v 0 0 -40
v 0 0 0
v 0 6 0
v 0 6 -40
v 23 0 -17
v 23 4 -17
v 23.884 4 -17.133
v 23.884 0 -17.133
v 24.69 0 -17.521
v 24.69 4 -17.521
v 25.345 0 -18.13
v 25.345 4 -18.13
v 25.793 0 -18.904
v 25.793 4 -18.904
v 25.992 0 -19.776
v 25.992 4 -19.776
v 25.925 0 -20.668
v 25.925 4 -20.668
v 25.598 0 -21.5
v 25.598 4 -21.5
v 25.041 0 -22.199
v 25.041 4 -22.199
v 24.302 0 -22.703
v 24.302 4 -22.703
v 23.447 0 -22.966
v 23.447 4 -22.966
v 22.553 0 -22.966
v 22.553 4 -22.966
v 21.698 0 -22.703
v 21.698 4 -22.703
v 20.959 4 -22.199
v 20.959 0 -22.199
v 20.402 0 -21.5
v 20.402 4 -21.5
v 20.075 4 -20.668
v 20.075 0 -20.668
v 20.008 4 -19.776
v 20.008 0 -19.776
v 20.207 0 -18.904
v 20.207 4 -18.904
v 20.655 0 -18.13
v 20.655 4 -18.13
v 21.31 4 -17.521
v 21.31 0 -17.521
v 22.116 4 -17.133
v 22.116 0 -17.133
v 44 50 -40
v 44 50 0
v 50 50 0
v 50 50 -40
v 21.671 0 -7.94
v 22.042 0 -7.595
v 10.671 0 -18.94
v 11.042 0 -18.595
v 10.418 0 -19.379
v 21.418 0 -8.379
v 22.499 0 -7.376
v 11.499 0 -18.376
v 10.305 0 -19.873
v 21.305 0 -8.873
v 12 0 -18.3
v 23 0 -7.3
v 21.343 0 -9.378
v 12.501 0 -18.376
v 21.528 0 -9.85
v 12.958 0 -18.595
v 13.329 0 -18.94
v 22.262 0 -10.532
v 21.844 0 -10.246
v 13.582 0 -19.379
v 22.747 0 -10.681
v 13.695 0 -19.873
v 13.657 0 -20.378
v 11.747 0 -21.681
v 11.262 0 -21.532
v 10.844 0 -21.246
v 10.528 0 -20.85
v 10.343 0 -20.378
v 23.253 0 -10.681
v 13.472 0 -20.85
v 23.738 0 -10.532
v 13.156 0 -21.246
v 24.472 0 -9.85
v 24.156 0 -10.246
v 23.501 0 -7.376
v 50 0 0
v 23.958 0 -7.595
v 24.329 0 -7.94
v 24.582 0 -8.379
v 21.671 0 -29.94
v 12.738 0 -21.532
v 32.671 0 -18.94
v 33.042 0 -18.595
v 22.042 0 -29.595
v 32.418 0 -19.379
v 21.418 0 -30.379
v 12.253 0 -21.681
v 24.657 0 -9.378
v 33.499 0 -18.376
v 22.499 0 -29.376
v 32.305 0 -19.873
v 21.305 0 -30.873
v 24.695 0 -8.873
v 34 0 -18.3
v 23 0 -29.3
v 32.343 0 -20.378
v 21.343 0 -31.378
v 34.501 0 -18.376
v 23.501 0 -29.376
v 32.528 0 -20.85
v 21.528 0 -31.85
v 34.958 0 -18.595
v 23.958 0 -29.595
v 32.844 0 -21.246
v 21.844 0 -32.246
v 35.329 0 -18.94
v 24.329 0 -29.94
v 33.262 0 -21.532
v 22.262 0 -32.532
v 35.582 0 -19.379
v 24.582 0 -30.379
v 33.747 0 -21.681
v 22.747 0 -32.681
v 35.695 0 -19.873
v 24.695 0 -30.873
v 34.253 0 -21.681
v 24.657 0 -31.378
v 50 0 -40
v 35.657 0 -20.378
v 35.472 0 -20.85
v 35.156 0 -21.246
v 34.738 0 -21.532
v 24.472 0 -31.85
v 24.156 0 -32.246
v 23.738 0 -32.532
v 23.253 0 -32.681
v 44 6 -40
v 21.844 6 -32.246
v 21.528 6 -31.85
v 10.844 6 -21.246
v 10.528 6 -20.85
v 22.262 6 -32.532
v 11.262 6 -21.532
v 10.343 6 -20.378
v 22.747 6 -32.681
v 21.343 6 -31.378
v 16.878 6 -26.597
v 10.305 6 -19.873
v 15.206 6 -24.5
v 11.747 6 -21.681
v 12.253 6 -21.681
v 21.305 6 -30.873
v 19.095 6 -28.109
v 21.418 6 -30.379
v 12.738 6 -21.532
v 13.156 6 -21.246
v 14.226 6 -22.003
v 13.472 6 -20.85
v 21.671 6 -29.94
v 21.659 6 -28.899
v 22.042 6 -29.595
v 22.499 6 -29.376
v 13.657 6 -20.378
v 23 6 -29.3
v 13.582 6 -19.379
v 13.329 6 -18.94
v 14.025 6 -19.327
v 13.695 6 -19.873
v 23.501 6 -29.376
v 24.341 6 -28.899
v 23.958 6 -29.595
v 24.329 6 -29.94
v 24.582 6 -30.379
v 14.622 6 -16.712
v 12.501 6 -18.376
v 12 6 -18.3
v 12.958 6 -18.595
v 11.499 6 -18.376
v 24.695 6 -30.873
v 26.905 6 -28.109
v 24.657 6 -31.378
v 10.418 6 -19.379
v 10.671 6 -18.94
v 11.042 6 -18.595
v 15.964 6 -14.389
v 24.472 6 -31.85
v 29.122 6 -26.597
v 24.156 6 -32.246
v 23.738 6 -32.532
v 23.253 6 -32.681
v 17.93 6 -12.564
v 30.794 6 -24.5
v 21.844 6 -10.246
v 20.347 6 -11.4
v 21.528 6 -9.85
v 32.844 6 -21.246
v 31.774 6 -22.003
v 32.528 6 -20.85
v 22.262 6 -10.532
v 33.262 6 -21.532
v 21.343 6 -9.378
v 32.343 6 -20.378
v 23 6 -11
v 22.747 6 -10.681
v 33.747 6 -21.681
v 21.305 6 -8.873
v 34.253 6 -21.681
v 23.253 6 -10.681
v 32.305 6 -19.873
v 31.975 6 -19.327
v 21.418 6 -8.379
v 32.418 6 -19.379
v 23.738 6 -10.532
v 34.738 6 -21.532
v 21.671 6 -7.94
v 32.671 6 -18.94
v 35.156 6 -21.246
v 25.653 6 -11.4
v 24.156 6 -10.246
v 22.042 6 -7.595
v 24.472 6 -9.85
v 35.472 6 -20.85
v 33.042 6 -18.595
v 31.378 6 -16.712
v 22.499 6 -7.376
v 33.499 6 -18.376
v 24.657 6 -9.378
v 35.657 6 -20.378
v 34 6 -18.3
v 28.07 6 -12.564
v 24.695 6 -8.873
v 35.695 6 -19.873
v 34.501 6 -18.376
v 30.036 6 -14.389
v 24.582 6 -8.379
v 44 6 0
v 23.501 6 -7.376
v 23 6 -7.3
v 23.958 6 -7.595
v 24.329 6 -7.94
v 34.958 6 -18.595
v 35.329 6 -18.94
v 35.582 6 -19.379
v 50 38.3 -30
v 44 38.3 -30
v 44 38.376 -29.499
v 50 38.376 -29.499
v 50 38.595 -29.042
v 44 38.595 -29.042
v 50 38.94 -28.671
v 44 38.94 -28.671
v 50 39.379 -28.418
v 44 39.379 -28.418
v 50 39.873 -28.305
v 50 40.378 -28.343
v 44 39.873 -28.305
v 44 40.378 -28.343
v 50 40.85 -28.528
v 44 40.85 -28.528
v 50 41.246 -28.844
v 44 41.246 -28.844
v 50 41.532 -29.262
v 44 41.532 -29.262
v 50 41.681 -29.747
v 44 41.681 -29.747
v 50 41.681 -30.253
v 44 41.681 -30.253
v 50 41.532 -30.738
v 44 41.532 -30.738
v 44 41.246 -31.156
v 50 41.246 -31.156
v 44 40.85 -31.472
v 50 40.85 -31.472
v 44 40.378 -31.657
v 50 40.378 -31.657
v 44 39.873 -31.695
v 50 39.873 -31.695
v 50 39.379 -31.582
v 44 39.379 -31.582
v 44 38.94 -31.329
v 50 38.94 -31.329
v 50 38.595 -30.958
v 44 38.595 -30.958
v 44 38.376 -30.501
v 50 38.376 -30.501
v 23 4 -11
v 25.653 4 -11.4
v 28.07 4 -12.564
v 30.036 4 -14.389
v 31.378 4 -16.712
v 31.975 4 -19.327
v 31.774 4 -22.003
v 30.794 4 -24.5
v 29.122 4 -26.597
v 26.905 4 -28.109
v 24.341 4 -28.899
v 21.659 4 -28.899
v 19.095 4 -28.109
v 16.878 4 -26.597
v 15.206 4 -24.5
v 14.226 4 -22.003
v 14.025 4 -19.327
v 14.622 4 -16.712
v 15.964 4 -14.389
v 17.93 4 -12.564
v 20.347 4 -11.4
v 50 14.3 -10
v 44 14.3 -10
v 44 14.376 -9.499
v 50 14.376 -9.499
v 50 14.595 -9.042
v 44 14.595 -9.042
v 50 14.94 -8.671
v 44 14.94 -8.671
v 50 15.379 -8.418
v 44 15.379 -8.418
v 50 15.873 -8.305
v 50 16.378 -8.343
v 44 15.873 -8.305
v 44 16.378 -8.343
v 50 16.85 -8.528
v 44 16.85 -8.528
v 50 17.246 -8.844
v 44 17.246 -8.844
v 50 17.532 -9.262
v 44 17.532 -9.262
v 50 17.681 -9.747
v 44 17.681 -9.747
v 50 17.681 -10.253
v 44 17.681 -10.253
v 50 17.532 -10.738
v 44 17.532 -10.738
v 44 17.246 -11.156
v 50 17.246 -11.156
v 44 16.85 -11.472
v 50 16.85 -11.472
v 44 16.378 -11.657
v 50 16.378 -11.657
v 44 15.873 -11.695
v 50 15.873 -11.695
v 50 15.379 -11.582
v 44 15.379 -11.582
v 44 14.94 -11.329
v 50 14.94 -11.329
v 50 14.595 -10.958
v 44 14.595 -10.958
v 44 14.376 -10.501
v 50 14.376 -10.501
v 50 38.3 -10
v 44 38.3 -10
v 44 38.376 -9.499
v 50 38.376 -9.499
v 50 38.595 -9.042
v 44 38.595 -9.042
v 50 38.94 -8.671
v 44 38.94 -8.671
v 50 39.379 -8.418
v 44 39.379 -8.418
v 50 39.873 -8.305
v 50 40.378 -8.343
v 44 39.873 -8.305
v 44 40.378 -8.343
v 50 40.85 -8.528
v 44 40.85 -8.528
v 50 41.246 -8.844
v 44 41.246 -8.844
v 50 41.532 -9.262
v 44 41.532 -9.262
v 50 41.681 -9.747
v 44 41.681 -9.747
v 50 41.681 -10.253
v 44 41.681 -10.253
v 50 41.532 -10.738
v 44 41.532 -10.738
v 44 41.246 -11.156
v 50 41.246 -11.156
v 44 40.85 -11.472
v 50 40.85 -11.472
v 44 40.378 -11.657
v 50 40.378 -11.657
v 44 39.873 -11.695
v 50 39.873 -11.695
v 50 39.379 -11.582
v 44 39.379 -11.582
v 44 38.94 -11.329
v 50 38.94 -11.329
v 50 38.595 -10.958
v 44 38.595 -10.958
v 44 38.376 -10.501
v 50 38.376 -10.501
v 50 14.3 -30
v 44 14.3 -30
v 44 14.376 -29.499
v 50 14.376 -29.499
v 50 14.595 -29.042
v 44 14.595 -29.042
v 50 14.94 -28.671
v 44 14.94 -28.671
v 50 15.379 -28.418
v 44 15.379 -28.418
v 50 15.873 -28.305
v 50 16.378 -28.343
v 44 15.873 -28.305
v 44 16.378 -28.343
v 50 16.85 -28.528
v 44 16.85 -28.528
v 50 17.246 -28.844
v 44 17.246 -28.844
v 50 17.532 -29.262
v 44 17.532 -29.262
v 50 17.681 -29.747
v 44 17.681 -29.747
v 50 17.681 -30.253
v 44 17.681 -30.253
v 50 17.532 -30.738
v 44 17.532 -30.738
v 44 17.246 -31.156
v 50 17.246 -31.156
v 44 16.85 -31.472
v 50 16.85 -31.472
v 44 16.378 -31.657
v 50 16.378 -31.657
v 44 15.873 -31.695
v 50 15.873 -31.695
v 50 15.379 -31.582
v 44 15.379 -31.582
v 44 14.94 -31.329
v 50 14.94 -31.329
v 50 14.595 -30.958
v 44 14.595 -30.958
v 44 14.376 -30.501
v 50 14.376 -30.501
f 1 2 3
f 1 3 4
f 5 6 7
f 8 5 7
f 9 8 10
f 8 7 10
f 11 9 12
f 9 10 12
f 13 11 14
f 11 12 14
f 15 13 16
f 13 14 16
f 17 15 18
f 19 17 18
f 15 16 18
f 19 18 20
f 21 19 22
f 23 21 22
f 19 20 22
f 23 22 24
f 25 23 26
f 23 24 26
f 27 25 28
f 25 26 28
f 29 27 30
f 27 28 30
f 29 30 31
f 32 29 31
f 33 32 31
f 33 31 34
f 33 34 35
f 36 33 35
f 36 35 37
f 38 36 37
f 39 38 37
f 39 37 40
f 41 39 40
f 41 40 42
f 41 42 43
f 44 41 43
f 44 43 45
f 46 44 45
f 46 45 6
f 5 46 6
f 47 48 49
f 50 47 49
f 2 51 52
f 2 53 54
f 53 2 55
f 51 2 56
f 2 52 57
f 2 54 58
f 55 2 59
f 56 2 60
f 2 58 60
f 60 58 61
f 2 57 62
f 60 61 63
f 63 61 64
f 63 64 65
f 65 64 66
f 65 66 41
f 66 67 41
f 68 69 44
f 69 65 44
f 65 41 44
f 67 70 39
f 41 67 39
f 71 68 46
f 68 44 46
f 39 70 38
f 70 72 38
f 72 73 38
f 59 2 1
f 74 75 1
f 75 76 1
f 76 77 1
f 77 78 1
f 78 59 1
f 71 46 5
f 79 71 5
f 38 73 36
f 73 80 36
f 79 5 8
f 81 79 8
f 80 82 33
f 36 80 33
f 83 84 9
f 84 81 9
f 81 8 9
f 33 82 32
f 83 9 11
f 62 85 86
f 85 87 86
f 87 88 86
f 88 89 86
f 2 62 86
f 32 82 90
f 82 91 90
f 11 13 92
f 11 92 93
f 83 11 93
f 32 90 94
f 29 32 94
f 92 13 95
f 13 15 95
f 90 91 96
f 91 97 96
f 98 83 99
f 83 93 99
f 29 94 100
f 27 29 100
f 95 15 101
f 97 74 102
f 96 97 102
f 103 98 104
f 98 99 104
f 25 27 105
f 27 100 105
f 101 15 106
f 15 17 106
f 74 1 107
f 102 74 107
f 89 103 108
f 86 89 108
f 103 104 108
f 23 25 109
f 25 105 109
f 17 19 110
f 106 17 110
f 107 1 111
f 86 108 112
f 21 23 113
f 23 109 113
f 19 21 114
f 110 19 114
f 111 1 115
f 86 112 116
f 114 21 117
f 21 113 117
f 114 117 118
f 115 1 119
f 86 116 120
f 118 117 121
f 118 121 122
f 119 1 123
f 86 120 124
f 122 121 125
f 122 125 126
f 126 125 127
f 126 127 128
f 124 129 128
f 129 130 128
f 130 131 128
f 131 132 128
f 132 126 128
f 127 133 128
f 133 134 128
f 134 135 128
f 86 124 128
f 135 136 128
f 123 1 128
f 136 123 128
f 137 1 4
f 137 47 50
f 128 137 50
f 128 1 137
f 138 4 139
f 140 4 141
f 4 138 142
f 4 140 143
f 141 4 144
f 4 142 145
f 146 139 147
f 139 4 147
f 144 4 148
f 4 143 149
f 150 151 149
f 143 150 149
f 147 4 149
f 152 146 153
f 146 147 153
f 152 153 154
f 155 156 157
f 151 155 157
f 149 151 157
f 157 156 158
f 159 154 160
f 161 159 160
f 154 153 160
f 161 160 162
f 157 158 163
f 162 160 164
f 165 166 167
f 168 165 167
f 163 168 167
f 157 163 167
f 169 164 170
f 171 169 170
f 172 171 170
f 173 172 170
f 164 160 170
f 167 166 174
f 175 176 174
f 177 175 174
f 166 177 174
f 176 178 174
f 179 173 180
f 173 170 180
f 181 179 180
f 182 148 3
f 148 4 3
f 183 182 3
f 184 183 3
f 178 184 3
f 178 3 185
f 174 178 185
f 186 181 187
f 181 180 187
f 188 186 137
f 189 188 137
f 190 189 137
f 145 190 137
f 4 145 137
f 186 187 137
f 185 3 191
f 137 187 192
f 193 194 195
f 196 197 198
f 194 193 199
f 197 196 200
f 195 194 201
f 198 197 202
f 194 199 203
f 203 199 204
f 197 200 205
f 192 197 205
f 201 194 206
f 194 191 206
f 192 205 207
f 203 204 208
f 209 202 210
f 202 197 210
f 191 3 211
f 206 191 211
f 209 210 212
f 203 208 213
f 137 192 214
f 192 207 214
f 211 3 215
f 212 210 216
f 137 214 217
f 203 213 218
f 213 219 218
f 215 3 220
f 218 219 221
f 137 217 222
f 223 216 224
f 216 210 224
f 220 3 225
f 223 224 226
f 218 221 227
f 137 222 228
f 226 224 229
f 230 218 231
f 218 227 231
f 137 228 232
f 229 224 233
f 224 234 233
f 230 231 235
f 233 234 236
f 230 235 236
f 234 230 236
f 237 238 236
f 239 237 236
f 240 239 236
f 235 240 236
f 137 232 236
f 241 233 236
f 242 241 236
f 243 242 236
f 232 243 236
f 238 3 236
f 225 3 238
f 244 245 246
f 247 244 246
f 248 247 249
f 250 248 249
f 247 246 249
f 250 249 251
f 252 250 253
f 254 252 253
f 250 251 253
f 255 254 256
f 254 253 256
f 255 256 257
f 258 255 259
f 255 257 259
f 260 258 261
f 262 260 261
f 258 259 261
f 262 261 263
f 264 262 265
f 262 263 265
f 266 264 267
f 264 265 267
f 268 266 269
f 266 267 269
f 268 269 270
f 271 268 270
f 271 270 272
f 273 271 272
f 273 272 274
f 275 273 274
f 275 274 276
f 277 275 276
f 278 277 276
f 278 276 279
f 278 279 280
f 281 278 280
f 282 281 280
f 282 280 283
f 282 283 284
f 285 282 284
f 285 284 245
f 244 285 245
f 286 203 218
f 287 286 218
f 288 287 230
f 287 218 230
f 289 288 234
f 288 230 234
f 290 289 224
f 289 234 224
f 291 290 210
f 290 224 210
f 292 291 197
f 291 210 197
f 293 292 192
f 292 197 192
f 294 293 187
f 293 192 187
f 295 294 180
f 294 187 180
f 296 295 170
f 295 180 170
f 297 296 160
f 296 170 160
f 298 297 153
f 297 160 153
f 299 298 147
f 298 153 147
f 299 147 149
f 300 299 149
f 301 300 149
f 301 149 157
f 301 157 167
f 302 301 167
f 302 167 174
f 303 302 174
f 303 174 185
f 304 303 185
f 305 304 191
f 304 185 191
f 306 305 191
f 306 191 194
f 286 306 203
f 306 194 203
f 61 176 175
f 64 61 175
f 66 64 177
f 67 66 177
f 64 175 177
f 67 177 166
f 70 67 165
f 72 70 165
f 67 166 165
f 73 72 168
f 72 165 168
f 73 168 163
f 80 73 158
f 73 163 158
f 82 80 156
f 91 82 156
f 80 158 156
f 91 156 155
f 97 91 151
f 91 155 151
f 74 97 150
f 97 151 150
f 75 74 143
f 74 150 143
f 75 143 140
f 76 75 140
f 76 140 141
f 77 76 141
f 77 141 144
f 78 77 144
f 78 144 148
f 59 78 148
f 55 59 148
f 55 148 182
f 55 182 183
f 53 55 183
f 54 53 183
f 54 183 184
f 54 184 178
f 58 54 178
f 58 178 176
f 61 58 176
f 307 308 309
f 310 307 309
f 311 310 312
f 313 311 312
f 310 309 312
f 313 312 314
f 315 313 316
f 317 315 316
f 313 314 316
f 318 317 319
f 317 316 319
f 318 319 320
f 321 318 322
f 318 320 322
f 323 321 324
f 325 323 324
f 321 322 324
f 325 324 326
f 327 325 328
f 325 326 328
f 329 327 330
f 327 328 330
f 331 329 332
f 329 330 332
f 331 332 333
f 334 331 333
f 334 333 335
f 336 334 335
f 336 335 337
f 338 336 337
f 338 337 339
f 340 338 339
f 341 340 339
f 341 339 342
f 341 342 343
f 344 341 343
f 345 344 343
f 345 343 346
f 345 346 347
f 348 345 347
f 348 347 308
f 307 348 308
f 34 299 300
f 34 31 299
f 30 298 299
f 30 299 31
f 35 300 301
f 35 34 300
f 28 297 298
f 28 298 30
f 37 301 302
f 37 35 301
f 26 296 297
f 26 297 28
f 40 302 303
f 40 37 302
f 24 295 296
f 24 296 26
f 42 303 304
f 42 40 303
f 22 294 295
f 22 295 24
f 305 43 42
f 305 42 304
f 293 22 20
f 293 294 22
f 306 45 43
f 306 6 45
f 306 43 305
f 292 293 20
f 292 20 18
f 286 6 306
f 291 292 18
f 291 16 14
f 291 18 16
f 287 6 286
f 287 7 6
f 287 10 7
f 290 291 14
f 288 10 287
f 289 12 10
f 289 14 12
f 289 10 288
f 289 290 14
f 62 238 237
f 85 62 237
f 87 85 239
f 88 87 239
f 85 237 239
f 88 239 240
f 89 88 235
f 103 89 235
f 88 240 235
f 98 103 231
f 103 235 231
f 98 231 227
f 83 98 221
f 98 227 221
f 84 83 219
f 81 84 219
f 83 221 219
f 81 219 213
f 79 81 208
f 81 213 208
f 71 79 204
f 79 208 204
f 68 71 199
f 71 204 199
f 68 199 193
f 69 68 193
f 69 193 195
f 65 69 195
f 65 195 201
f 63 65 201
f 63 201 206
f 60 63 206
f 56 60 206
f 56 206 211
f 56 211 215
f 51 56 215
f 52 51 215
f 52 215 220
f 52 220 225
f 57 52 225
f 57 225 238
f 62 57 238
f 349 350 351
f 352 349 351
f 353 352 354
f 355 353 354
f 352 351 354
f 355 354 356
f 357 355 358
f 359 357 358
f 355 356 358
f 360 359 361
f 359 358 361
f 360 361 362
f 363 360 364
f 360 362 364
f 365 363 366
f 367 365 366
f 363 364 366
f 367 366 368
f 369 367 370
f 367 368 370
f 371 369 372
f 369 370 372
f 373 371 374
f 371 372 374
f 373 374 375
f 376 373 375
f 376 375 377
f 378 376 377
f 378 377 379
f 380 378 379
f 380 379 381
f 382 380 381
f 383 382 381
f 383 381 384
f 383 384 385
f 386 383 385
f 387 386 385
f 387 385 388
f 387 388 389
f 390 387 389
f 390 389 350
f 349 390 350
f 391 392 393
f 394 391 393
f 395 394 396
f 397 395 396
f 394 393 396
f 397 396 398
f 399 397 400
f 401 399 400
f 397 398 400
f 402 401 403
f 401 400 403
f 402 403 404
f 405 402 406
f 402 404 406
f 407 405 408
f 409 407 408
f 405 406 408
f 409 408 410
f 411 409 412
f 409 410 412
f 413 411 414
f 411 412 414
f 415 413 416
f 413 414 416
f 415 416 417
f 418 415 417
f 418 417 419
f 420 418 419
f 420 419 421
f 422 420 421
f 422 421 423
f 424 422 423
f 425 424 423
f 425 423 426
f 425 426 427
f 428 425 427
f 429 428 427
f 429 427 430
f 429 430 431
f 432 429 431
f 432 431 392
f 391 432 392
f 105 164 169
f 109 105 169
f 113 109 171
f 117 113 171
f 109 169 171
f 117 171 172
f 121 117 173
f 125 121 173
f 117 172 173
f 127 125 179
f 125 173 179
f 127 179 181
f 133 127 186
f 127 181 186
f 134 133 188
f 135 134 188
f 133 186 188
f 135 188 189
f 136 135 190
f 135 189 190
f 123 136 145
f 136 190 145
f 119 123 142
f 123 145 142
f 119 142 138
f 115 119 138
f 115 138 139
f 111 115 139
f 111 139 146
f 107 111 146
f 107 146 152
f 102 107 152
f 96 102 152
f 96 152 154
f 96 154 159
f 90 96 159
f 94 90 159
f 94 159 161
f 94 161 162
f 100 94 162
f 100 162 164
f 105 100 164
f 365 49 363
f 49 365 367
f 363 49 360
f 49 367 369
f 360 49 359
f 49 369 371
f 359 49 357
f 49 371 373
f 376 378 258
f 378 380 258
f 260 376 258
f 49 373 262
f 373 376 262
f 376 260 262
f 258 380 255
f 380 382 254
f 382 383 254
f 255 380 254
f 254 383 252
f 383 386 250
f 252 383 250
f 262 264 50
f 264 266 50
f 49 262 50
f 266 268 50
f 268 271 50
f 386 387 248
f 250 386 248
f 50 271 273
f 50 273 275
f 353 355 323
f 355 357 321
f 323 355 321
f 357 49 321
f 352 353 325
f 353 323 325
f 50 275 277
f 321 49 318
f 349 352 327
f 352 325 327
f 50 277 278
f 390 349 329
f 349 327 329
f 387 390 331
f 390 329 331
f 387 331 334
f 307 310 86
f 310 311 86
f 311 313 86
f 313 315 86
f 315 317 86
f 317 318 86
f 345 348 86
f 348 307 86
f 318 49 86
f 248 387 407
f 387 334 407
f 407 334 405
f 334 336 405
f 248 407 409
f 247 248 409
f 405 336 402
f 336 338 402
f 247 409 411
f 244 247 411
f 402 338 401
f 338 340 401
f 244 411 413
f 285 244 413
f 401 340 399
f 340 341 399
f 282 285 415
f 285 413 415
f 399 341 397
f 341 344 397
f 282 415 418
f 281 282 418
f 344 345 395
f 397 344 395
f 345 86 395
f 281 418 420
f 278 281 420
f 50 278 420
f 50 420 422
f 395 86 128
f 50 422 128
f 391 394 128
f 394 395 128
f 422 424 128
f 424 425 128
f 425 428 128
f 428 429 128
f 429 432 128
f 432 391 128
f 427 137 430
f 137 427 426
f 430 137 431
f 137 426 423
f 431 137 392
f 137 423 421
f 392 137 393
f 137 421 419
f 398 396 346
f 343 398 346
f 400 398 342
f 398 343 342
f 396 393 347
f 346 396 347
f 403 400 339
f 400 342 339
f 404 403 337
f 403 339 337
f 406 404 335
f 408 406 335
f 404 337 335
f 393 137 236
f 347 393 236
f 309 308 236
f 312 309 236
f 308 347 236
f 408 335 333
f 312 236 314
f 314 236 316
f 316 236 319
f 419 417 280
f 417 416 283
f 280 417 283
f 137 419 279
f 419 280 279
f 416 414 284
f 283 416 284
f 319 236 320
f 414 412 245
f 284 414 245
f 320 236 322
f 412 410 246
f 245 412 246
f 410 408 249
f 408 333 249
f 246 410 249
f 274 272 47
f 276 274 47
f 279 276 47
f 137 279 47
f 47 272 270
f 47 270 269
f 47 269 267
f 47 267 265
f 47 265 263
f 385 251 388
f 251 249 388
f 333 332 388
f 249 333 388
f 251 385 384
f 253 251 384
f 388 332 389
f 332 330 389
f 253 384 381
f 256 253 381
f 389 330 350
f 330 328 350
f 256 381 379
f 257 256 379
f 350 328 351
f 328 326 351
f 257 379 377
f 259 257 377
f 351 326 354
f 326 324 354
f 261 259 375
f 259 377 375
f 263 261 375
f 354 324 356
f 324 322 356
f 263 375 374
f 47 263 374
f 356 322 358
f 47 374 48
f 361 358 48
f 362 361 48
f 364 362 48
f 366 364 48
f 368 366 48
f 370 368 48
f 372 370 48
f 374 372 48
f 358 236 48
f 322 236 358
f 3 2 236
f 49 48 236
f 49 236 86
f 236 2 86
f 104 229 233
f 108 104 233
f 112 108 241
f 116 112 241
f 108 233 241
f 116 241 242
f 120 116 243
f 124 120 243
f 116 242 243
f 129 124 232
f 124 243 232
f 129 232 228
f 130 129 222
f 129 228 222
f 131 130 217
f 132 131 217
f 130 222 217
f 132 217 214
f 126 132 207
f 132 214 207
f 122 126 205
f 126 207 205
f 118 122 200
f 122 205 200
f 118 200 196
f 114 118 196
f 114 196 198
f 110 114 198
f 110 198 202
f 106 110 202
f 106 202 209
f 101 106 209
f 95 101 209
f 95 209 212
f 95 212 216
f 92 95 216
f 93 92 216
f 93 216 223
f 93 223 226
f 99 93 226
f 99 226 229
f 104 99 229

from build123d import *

# Parameters (mm, degrees)
SKETCH1_W           = 50
SKETCH1_H           = 40
BOSS_EXTRUDE1_DEPTH = 50
SKETCH2_W           = 44
SKETCH2_H           = 44
CUT_EXTRUDE1_DEPTH  = 50
SKETCH3_R           = 1.7
CUT_EXTRUDE3_DEPTH  = 78.691698398
SKETCH5_R           = 9
CUT_EXTRUDE4_DEPTH  = 2
SKETCH6_R           = 3
CUT_EXTRUDE5_DEPTH  = 79.841613378
SKETCH7_R           = 1.7
CUT_EXTRUDE6_DEPTH  = 78.691698398


with BuildPart() as part:
    # Sketch1 → Boss-Extrude1 (new body)
    with BuildSketch(Plane(origin=(0, 0, 0), x_dir=(1, 0, 0), z_dir=(0, 1, 0))):
        with Locations((25, 20)):
            Rectangle(SKETCH1_W, SKETCH1_H)
    extrude(amount=BOSS_EXTRUDE1_DEPTH)

    # Sketch2 → Cut-Extrude1 (cut)
    with BuildSketch(Plane.XY):
        with Locations((22, 28)):
            Rectangle(SKETCH2_W, SKETCH2_H)
    extrude(amount=-CUT_EXTRUDE1_DEPTH, mode=Mode.SUBTRACT)

    # Sketch3 → Cut-Extrude3 (cut, through all)
    with BuildSketch(Plane.ZY.offset(-44)):
        with Locations(Location((-30, 40, 0), (0, 0, 270))):
            Circle(SKETCH3_R)
        with Locations(Location((-10, 40, 0), (0, 0, 270))):
            Circle(SKETCH3_R)
        with Locations(Location((-10, 16, 0), (0, 0, 270))):
            Circle(SKETCH3_R)
        with Locations(Location((-30, 16, 0), (0, 0, 270))):
            Circle(SKETCH3_R)
    extrude(amount=-CUT_EXTRUDE3_DEPTH, mode=Mode.SUBTRACT)

    # Sketch5 → Cut-Extrude4 (cut)
    with BuildSketch(Plane(origin=(0, 6, 0), x_dir=(1, 0, 0), z_dir=(0, 1, 0))):
        with Locations(Location((23, 20, 0), (0, 0, 270))):
            Circle(SKETCH5_R)
    extrude(amount=-CUT_EXTRUDE4_DEPTH, mode=Mode.SUBTRACT)

    # Sketch6 → Cut-Extrude5 (cut, through all)
    with BuildSketch(Plane(origin=(0, 4, 0), x_dir=(1, 0, 0), z_dir=(0, 1, 0))):
        with Locations(Location((23, 20, 0), (0, 0, 270))):
            Circle(SKETCH6_R)
    extrude(amount=-CUT_EXTRUDE5_DEPTH, mode=Mode.SUBTRACT)

    # Sketch7 → Cut-Extrude6 (cut, through all)
    with BuildSketch(Plane(origin=(0, 6, 0), x_dir=(1, 0, 0), z_dir=(0, 1, 0))):
        with Locations(Location((12, 20, 0), (0, 0, 270))):
            Circle(SKETCH7_R)
        with Locations(Location((23, 31, 0), (0, 0, 270))):
            Circle(SKETCH7_R)
        with Locations(Location((34, 20, 0), (0, 0, 270))):
            Circle(SKETCH7_R)
        with Locations(Location((23, 9, 0), (0, 0, 270))):
            Circle(SKETCH7_R)
    extrude(amount=-CUT_EXTRUDE6_DEPTH, mode=Mode.SUBTRACT)


solid = part.part
